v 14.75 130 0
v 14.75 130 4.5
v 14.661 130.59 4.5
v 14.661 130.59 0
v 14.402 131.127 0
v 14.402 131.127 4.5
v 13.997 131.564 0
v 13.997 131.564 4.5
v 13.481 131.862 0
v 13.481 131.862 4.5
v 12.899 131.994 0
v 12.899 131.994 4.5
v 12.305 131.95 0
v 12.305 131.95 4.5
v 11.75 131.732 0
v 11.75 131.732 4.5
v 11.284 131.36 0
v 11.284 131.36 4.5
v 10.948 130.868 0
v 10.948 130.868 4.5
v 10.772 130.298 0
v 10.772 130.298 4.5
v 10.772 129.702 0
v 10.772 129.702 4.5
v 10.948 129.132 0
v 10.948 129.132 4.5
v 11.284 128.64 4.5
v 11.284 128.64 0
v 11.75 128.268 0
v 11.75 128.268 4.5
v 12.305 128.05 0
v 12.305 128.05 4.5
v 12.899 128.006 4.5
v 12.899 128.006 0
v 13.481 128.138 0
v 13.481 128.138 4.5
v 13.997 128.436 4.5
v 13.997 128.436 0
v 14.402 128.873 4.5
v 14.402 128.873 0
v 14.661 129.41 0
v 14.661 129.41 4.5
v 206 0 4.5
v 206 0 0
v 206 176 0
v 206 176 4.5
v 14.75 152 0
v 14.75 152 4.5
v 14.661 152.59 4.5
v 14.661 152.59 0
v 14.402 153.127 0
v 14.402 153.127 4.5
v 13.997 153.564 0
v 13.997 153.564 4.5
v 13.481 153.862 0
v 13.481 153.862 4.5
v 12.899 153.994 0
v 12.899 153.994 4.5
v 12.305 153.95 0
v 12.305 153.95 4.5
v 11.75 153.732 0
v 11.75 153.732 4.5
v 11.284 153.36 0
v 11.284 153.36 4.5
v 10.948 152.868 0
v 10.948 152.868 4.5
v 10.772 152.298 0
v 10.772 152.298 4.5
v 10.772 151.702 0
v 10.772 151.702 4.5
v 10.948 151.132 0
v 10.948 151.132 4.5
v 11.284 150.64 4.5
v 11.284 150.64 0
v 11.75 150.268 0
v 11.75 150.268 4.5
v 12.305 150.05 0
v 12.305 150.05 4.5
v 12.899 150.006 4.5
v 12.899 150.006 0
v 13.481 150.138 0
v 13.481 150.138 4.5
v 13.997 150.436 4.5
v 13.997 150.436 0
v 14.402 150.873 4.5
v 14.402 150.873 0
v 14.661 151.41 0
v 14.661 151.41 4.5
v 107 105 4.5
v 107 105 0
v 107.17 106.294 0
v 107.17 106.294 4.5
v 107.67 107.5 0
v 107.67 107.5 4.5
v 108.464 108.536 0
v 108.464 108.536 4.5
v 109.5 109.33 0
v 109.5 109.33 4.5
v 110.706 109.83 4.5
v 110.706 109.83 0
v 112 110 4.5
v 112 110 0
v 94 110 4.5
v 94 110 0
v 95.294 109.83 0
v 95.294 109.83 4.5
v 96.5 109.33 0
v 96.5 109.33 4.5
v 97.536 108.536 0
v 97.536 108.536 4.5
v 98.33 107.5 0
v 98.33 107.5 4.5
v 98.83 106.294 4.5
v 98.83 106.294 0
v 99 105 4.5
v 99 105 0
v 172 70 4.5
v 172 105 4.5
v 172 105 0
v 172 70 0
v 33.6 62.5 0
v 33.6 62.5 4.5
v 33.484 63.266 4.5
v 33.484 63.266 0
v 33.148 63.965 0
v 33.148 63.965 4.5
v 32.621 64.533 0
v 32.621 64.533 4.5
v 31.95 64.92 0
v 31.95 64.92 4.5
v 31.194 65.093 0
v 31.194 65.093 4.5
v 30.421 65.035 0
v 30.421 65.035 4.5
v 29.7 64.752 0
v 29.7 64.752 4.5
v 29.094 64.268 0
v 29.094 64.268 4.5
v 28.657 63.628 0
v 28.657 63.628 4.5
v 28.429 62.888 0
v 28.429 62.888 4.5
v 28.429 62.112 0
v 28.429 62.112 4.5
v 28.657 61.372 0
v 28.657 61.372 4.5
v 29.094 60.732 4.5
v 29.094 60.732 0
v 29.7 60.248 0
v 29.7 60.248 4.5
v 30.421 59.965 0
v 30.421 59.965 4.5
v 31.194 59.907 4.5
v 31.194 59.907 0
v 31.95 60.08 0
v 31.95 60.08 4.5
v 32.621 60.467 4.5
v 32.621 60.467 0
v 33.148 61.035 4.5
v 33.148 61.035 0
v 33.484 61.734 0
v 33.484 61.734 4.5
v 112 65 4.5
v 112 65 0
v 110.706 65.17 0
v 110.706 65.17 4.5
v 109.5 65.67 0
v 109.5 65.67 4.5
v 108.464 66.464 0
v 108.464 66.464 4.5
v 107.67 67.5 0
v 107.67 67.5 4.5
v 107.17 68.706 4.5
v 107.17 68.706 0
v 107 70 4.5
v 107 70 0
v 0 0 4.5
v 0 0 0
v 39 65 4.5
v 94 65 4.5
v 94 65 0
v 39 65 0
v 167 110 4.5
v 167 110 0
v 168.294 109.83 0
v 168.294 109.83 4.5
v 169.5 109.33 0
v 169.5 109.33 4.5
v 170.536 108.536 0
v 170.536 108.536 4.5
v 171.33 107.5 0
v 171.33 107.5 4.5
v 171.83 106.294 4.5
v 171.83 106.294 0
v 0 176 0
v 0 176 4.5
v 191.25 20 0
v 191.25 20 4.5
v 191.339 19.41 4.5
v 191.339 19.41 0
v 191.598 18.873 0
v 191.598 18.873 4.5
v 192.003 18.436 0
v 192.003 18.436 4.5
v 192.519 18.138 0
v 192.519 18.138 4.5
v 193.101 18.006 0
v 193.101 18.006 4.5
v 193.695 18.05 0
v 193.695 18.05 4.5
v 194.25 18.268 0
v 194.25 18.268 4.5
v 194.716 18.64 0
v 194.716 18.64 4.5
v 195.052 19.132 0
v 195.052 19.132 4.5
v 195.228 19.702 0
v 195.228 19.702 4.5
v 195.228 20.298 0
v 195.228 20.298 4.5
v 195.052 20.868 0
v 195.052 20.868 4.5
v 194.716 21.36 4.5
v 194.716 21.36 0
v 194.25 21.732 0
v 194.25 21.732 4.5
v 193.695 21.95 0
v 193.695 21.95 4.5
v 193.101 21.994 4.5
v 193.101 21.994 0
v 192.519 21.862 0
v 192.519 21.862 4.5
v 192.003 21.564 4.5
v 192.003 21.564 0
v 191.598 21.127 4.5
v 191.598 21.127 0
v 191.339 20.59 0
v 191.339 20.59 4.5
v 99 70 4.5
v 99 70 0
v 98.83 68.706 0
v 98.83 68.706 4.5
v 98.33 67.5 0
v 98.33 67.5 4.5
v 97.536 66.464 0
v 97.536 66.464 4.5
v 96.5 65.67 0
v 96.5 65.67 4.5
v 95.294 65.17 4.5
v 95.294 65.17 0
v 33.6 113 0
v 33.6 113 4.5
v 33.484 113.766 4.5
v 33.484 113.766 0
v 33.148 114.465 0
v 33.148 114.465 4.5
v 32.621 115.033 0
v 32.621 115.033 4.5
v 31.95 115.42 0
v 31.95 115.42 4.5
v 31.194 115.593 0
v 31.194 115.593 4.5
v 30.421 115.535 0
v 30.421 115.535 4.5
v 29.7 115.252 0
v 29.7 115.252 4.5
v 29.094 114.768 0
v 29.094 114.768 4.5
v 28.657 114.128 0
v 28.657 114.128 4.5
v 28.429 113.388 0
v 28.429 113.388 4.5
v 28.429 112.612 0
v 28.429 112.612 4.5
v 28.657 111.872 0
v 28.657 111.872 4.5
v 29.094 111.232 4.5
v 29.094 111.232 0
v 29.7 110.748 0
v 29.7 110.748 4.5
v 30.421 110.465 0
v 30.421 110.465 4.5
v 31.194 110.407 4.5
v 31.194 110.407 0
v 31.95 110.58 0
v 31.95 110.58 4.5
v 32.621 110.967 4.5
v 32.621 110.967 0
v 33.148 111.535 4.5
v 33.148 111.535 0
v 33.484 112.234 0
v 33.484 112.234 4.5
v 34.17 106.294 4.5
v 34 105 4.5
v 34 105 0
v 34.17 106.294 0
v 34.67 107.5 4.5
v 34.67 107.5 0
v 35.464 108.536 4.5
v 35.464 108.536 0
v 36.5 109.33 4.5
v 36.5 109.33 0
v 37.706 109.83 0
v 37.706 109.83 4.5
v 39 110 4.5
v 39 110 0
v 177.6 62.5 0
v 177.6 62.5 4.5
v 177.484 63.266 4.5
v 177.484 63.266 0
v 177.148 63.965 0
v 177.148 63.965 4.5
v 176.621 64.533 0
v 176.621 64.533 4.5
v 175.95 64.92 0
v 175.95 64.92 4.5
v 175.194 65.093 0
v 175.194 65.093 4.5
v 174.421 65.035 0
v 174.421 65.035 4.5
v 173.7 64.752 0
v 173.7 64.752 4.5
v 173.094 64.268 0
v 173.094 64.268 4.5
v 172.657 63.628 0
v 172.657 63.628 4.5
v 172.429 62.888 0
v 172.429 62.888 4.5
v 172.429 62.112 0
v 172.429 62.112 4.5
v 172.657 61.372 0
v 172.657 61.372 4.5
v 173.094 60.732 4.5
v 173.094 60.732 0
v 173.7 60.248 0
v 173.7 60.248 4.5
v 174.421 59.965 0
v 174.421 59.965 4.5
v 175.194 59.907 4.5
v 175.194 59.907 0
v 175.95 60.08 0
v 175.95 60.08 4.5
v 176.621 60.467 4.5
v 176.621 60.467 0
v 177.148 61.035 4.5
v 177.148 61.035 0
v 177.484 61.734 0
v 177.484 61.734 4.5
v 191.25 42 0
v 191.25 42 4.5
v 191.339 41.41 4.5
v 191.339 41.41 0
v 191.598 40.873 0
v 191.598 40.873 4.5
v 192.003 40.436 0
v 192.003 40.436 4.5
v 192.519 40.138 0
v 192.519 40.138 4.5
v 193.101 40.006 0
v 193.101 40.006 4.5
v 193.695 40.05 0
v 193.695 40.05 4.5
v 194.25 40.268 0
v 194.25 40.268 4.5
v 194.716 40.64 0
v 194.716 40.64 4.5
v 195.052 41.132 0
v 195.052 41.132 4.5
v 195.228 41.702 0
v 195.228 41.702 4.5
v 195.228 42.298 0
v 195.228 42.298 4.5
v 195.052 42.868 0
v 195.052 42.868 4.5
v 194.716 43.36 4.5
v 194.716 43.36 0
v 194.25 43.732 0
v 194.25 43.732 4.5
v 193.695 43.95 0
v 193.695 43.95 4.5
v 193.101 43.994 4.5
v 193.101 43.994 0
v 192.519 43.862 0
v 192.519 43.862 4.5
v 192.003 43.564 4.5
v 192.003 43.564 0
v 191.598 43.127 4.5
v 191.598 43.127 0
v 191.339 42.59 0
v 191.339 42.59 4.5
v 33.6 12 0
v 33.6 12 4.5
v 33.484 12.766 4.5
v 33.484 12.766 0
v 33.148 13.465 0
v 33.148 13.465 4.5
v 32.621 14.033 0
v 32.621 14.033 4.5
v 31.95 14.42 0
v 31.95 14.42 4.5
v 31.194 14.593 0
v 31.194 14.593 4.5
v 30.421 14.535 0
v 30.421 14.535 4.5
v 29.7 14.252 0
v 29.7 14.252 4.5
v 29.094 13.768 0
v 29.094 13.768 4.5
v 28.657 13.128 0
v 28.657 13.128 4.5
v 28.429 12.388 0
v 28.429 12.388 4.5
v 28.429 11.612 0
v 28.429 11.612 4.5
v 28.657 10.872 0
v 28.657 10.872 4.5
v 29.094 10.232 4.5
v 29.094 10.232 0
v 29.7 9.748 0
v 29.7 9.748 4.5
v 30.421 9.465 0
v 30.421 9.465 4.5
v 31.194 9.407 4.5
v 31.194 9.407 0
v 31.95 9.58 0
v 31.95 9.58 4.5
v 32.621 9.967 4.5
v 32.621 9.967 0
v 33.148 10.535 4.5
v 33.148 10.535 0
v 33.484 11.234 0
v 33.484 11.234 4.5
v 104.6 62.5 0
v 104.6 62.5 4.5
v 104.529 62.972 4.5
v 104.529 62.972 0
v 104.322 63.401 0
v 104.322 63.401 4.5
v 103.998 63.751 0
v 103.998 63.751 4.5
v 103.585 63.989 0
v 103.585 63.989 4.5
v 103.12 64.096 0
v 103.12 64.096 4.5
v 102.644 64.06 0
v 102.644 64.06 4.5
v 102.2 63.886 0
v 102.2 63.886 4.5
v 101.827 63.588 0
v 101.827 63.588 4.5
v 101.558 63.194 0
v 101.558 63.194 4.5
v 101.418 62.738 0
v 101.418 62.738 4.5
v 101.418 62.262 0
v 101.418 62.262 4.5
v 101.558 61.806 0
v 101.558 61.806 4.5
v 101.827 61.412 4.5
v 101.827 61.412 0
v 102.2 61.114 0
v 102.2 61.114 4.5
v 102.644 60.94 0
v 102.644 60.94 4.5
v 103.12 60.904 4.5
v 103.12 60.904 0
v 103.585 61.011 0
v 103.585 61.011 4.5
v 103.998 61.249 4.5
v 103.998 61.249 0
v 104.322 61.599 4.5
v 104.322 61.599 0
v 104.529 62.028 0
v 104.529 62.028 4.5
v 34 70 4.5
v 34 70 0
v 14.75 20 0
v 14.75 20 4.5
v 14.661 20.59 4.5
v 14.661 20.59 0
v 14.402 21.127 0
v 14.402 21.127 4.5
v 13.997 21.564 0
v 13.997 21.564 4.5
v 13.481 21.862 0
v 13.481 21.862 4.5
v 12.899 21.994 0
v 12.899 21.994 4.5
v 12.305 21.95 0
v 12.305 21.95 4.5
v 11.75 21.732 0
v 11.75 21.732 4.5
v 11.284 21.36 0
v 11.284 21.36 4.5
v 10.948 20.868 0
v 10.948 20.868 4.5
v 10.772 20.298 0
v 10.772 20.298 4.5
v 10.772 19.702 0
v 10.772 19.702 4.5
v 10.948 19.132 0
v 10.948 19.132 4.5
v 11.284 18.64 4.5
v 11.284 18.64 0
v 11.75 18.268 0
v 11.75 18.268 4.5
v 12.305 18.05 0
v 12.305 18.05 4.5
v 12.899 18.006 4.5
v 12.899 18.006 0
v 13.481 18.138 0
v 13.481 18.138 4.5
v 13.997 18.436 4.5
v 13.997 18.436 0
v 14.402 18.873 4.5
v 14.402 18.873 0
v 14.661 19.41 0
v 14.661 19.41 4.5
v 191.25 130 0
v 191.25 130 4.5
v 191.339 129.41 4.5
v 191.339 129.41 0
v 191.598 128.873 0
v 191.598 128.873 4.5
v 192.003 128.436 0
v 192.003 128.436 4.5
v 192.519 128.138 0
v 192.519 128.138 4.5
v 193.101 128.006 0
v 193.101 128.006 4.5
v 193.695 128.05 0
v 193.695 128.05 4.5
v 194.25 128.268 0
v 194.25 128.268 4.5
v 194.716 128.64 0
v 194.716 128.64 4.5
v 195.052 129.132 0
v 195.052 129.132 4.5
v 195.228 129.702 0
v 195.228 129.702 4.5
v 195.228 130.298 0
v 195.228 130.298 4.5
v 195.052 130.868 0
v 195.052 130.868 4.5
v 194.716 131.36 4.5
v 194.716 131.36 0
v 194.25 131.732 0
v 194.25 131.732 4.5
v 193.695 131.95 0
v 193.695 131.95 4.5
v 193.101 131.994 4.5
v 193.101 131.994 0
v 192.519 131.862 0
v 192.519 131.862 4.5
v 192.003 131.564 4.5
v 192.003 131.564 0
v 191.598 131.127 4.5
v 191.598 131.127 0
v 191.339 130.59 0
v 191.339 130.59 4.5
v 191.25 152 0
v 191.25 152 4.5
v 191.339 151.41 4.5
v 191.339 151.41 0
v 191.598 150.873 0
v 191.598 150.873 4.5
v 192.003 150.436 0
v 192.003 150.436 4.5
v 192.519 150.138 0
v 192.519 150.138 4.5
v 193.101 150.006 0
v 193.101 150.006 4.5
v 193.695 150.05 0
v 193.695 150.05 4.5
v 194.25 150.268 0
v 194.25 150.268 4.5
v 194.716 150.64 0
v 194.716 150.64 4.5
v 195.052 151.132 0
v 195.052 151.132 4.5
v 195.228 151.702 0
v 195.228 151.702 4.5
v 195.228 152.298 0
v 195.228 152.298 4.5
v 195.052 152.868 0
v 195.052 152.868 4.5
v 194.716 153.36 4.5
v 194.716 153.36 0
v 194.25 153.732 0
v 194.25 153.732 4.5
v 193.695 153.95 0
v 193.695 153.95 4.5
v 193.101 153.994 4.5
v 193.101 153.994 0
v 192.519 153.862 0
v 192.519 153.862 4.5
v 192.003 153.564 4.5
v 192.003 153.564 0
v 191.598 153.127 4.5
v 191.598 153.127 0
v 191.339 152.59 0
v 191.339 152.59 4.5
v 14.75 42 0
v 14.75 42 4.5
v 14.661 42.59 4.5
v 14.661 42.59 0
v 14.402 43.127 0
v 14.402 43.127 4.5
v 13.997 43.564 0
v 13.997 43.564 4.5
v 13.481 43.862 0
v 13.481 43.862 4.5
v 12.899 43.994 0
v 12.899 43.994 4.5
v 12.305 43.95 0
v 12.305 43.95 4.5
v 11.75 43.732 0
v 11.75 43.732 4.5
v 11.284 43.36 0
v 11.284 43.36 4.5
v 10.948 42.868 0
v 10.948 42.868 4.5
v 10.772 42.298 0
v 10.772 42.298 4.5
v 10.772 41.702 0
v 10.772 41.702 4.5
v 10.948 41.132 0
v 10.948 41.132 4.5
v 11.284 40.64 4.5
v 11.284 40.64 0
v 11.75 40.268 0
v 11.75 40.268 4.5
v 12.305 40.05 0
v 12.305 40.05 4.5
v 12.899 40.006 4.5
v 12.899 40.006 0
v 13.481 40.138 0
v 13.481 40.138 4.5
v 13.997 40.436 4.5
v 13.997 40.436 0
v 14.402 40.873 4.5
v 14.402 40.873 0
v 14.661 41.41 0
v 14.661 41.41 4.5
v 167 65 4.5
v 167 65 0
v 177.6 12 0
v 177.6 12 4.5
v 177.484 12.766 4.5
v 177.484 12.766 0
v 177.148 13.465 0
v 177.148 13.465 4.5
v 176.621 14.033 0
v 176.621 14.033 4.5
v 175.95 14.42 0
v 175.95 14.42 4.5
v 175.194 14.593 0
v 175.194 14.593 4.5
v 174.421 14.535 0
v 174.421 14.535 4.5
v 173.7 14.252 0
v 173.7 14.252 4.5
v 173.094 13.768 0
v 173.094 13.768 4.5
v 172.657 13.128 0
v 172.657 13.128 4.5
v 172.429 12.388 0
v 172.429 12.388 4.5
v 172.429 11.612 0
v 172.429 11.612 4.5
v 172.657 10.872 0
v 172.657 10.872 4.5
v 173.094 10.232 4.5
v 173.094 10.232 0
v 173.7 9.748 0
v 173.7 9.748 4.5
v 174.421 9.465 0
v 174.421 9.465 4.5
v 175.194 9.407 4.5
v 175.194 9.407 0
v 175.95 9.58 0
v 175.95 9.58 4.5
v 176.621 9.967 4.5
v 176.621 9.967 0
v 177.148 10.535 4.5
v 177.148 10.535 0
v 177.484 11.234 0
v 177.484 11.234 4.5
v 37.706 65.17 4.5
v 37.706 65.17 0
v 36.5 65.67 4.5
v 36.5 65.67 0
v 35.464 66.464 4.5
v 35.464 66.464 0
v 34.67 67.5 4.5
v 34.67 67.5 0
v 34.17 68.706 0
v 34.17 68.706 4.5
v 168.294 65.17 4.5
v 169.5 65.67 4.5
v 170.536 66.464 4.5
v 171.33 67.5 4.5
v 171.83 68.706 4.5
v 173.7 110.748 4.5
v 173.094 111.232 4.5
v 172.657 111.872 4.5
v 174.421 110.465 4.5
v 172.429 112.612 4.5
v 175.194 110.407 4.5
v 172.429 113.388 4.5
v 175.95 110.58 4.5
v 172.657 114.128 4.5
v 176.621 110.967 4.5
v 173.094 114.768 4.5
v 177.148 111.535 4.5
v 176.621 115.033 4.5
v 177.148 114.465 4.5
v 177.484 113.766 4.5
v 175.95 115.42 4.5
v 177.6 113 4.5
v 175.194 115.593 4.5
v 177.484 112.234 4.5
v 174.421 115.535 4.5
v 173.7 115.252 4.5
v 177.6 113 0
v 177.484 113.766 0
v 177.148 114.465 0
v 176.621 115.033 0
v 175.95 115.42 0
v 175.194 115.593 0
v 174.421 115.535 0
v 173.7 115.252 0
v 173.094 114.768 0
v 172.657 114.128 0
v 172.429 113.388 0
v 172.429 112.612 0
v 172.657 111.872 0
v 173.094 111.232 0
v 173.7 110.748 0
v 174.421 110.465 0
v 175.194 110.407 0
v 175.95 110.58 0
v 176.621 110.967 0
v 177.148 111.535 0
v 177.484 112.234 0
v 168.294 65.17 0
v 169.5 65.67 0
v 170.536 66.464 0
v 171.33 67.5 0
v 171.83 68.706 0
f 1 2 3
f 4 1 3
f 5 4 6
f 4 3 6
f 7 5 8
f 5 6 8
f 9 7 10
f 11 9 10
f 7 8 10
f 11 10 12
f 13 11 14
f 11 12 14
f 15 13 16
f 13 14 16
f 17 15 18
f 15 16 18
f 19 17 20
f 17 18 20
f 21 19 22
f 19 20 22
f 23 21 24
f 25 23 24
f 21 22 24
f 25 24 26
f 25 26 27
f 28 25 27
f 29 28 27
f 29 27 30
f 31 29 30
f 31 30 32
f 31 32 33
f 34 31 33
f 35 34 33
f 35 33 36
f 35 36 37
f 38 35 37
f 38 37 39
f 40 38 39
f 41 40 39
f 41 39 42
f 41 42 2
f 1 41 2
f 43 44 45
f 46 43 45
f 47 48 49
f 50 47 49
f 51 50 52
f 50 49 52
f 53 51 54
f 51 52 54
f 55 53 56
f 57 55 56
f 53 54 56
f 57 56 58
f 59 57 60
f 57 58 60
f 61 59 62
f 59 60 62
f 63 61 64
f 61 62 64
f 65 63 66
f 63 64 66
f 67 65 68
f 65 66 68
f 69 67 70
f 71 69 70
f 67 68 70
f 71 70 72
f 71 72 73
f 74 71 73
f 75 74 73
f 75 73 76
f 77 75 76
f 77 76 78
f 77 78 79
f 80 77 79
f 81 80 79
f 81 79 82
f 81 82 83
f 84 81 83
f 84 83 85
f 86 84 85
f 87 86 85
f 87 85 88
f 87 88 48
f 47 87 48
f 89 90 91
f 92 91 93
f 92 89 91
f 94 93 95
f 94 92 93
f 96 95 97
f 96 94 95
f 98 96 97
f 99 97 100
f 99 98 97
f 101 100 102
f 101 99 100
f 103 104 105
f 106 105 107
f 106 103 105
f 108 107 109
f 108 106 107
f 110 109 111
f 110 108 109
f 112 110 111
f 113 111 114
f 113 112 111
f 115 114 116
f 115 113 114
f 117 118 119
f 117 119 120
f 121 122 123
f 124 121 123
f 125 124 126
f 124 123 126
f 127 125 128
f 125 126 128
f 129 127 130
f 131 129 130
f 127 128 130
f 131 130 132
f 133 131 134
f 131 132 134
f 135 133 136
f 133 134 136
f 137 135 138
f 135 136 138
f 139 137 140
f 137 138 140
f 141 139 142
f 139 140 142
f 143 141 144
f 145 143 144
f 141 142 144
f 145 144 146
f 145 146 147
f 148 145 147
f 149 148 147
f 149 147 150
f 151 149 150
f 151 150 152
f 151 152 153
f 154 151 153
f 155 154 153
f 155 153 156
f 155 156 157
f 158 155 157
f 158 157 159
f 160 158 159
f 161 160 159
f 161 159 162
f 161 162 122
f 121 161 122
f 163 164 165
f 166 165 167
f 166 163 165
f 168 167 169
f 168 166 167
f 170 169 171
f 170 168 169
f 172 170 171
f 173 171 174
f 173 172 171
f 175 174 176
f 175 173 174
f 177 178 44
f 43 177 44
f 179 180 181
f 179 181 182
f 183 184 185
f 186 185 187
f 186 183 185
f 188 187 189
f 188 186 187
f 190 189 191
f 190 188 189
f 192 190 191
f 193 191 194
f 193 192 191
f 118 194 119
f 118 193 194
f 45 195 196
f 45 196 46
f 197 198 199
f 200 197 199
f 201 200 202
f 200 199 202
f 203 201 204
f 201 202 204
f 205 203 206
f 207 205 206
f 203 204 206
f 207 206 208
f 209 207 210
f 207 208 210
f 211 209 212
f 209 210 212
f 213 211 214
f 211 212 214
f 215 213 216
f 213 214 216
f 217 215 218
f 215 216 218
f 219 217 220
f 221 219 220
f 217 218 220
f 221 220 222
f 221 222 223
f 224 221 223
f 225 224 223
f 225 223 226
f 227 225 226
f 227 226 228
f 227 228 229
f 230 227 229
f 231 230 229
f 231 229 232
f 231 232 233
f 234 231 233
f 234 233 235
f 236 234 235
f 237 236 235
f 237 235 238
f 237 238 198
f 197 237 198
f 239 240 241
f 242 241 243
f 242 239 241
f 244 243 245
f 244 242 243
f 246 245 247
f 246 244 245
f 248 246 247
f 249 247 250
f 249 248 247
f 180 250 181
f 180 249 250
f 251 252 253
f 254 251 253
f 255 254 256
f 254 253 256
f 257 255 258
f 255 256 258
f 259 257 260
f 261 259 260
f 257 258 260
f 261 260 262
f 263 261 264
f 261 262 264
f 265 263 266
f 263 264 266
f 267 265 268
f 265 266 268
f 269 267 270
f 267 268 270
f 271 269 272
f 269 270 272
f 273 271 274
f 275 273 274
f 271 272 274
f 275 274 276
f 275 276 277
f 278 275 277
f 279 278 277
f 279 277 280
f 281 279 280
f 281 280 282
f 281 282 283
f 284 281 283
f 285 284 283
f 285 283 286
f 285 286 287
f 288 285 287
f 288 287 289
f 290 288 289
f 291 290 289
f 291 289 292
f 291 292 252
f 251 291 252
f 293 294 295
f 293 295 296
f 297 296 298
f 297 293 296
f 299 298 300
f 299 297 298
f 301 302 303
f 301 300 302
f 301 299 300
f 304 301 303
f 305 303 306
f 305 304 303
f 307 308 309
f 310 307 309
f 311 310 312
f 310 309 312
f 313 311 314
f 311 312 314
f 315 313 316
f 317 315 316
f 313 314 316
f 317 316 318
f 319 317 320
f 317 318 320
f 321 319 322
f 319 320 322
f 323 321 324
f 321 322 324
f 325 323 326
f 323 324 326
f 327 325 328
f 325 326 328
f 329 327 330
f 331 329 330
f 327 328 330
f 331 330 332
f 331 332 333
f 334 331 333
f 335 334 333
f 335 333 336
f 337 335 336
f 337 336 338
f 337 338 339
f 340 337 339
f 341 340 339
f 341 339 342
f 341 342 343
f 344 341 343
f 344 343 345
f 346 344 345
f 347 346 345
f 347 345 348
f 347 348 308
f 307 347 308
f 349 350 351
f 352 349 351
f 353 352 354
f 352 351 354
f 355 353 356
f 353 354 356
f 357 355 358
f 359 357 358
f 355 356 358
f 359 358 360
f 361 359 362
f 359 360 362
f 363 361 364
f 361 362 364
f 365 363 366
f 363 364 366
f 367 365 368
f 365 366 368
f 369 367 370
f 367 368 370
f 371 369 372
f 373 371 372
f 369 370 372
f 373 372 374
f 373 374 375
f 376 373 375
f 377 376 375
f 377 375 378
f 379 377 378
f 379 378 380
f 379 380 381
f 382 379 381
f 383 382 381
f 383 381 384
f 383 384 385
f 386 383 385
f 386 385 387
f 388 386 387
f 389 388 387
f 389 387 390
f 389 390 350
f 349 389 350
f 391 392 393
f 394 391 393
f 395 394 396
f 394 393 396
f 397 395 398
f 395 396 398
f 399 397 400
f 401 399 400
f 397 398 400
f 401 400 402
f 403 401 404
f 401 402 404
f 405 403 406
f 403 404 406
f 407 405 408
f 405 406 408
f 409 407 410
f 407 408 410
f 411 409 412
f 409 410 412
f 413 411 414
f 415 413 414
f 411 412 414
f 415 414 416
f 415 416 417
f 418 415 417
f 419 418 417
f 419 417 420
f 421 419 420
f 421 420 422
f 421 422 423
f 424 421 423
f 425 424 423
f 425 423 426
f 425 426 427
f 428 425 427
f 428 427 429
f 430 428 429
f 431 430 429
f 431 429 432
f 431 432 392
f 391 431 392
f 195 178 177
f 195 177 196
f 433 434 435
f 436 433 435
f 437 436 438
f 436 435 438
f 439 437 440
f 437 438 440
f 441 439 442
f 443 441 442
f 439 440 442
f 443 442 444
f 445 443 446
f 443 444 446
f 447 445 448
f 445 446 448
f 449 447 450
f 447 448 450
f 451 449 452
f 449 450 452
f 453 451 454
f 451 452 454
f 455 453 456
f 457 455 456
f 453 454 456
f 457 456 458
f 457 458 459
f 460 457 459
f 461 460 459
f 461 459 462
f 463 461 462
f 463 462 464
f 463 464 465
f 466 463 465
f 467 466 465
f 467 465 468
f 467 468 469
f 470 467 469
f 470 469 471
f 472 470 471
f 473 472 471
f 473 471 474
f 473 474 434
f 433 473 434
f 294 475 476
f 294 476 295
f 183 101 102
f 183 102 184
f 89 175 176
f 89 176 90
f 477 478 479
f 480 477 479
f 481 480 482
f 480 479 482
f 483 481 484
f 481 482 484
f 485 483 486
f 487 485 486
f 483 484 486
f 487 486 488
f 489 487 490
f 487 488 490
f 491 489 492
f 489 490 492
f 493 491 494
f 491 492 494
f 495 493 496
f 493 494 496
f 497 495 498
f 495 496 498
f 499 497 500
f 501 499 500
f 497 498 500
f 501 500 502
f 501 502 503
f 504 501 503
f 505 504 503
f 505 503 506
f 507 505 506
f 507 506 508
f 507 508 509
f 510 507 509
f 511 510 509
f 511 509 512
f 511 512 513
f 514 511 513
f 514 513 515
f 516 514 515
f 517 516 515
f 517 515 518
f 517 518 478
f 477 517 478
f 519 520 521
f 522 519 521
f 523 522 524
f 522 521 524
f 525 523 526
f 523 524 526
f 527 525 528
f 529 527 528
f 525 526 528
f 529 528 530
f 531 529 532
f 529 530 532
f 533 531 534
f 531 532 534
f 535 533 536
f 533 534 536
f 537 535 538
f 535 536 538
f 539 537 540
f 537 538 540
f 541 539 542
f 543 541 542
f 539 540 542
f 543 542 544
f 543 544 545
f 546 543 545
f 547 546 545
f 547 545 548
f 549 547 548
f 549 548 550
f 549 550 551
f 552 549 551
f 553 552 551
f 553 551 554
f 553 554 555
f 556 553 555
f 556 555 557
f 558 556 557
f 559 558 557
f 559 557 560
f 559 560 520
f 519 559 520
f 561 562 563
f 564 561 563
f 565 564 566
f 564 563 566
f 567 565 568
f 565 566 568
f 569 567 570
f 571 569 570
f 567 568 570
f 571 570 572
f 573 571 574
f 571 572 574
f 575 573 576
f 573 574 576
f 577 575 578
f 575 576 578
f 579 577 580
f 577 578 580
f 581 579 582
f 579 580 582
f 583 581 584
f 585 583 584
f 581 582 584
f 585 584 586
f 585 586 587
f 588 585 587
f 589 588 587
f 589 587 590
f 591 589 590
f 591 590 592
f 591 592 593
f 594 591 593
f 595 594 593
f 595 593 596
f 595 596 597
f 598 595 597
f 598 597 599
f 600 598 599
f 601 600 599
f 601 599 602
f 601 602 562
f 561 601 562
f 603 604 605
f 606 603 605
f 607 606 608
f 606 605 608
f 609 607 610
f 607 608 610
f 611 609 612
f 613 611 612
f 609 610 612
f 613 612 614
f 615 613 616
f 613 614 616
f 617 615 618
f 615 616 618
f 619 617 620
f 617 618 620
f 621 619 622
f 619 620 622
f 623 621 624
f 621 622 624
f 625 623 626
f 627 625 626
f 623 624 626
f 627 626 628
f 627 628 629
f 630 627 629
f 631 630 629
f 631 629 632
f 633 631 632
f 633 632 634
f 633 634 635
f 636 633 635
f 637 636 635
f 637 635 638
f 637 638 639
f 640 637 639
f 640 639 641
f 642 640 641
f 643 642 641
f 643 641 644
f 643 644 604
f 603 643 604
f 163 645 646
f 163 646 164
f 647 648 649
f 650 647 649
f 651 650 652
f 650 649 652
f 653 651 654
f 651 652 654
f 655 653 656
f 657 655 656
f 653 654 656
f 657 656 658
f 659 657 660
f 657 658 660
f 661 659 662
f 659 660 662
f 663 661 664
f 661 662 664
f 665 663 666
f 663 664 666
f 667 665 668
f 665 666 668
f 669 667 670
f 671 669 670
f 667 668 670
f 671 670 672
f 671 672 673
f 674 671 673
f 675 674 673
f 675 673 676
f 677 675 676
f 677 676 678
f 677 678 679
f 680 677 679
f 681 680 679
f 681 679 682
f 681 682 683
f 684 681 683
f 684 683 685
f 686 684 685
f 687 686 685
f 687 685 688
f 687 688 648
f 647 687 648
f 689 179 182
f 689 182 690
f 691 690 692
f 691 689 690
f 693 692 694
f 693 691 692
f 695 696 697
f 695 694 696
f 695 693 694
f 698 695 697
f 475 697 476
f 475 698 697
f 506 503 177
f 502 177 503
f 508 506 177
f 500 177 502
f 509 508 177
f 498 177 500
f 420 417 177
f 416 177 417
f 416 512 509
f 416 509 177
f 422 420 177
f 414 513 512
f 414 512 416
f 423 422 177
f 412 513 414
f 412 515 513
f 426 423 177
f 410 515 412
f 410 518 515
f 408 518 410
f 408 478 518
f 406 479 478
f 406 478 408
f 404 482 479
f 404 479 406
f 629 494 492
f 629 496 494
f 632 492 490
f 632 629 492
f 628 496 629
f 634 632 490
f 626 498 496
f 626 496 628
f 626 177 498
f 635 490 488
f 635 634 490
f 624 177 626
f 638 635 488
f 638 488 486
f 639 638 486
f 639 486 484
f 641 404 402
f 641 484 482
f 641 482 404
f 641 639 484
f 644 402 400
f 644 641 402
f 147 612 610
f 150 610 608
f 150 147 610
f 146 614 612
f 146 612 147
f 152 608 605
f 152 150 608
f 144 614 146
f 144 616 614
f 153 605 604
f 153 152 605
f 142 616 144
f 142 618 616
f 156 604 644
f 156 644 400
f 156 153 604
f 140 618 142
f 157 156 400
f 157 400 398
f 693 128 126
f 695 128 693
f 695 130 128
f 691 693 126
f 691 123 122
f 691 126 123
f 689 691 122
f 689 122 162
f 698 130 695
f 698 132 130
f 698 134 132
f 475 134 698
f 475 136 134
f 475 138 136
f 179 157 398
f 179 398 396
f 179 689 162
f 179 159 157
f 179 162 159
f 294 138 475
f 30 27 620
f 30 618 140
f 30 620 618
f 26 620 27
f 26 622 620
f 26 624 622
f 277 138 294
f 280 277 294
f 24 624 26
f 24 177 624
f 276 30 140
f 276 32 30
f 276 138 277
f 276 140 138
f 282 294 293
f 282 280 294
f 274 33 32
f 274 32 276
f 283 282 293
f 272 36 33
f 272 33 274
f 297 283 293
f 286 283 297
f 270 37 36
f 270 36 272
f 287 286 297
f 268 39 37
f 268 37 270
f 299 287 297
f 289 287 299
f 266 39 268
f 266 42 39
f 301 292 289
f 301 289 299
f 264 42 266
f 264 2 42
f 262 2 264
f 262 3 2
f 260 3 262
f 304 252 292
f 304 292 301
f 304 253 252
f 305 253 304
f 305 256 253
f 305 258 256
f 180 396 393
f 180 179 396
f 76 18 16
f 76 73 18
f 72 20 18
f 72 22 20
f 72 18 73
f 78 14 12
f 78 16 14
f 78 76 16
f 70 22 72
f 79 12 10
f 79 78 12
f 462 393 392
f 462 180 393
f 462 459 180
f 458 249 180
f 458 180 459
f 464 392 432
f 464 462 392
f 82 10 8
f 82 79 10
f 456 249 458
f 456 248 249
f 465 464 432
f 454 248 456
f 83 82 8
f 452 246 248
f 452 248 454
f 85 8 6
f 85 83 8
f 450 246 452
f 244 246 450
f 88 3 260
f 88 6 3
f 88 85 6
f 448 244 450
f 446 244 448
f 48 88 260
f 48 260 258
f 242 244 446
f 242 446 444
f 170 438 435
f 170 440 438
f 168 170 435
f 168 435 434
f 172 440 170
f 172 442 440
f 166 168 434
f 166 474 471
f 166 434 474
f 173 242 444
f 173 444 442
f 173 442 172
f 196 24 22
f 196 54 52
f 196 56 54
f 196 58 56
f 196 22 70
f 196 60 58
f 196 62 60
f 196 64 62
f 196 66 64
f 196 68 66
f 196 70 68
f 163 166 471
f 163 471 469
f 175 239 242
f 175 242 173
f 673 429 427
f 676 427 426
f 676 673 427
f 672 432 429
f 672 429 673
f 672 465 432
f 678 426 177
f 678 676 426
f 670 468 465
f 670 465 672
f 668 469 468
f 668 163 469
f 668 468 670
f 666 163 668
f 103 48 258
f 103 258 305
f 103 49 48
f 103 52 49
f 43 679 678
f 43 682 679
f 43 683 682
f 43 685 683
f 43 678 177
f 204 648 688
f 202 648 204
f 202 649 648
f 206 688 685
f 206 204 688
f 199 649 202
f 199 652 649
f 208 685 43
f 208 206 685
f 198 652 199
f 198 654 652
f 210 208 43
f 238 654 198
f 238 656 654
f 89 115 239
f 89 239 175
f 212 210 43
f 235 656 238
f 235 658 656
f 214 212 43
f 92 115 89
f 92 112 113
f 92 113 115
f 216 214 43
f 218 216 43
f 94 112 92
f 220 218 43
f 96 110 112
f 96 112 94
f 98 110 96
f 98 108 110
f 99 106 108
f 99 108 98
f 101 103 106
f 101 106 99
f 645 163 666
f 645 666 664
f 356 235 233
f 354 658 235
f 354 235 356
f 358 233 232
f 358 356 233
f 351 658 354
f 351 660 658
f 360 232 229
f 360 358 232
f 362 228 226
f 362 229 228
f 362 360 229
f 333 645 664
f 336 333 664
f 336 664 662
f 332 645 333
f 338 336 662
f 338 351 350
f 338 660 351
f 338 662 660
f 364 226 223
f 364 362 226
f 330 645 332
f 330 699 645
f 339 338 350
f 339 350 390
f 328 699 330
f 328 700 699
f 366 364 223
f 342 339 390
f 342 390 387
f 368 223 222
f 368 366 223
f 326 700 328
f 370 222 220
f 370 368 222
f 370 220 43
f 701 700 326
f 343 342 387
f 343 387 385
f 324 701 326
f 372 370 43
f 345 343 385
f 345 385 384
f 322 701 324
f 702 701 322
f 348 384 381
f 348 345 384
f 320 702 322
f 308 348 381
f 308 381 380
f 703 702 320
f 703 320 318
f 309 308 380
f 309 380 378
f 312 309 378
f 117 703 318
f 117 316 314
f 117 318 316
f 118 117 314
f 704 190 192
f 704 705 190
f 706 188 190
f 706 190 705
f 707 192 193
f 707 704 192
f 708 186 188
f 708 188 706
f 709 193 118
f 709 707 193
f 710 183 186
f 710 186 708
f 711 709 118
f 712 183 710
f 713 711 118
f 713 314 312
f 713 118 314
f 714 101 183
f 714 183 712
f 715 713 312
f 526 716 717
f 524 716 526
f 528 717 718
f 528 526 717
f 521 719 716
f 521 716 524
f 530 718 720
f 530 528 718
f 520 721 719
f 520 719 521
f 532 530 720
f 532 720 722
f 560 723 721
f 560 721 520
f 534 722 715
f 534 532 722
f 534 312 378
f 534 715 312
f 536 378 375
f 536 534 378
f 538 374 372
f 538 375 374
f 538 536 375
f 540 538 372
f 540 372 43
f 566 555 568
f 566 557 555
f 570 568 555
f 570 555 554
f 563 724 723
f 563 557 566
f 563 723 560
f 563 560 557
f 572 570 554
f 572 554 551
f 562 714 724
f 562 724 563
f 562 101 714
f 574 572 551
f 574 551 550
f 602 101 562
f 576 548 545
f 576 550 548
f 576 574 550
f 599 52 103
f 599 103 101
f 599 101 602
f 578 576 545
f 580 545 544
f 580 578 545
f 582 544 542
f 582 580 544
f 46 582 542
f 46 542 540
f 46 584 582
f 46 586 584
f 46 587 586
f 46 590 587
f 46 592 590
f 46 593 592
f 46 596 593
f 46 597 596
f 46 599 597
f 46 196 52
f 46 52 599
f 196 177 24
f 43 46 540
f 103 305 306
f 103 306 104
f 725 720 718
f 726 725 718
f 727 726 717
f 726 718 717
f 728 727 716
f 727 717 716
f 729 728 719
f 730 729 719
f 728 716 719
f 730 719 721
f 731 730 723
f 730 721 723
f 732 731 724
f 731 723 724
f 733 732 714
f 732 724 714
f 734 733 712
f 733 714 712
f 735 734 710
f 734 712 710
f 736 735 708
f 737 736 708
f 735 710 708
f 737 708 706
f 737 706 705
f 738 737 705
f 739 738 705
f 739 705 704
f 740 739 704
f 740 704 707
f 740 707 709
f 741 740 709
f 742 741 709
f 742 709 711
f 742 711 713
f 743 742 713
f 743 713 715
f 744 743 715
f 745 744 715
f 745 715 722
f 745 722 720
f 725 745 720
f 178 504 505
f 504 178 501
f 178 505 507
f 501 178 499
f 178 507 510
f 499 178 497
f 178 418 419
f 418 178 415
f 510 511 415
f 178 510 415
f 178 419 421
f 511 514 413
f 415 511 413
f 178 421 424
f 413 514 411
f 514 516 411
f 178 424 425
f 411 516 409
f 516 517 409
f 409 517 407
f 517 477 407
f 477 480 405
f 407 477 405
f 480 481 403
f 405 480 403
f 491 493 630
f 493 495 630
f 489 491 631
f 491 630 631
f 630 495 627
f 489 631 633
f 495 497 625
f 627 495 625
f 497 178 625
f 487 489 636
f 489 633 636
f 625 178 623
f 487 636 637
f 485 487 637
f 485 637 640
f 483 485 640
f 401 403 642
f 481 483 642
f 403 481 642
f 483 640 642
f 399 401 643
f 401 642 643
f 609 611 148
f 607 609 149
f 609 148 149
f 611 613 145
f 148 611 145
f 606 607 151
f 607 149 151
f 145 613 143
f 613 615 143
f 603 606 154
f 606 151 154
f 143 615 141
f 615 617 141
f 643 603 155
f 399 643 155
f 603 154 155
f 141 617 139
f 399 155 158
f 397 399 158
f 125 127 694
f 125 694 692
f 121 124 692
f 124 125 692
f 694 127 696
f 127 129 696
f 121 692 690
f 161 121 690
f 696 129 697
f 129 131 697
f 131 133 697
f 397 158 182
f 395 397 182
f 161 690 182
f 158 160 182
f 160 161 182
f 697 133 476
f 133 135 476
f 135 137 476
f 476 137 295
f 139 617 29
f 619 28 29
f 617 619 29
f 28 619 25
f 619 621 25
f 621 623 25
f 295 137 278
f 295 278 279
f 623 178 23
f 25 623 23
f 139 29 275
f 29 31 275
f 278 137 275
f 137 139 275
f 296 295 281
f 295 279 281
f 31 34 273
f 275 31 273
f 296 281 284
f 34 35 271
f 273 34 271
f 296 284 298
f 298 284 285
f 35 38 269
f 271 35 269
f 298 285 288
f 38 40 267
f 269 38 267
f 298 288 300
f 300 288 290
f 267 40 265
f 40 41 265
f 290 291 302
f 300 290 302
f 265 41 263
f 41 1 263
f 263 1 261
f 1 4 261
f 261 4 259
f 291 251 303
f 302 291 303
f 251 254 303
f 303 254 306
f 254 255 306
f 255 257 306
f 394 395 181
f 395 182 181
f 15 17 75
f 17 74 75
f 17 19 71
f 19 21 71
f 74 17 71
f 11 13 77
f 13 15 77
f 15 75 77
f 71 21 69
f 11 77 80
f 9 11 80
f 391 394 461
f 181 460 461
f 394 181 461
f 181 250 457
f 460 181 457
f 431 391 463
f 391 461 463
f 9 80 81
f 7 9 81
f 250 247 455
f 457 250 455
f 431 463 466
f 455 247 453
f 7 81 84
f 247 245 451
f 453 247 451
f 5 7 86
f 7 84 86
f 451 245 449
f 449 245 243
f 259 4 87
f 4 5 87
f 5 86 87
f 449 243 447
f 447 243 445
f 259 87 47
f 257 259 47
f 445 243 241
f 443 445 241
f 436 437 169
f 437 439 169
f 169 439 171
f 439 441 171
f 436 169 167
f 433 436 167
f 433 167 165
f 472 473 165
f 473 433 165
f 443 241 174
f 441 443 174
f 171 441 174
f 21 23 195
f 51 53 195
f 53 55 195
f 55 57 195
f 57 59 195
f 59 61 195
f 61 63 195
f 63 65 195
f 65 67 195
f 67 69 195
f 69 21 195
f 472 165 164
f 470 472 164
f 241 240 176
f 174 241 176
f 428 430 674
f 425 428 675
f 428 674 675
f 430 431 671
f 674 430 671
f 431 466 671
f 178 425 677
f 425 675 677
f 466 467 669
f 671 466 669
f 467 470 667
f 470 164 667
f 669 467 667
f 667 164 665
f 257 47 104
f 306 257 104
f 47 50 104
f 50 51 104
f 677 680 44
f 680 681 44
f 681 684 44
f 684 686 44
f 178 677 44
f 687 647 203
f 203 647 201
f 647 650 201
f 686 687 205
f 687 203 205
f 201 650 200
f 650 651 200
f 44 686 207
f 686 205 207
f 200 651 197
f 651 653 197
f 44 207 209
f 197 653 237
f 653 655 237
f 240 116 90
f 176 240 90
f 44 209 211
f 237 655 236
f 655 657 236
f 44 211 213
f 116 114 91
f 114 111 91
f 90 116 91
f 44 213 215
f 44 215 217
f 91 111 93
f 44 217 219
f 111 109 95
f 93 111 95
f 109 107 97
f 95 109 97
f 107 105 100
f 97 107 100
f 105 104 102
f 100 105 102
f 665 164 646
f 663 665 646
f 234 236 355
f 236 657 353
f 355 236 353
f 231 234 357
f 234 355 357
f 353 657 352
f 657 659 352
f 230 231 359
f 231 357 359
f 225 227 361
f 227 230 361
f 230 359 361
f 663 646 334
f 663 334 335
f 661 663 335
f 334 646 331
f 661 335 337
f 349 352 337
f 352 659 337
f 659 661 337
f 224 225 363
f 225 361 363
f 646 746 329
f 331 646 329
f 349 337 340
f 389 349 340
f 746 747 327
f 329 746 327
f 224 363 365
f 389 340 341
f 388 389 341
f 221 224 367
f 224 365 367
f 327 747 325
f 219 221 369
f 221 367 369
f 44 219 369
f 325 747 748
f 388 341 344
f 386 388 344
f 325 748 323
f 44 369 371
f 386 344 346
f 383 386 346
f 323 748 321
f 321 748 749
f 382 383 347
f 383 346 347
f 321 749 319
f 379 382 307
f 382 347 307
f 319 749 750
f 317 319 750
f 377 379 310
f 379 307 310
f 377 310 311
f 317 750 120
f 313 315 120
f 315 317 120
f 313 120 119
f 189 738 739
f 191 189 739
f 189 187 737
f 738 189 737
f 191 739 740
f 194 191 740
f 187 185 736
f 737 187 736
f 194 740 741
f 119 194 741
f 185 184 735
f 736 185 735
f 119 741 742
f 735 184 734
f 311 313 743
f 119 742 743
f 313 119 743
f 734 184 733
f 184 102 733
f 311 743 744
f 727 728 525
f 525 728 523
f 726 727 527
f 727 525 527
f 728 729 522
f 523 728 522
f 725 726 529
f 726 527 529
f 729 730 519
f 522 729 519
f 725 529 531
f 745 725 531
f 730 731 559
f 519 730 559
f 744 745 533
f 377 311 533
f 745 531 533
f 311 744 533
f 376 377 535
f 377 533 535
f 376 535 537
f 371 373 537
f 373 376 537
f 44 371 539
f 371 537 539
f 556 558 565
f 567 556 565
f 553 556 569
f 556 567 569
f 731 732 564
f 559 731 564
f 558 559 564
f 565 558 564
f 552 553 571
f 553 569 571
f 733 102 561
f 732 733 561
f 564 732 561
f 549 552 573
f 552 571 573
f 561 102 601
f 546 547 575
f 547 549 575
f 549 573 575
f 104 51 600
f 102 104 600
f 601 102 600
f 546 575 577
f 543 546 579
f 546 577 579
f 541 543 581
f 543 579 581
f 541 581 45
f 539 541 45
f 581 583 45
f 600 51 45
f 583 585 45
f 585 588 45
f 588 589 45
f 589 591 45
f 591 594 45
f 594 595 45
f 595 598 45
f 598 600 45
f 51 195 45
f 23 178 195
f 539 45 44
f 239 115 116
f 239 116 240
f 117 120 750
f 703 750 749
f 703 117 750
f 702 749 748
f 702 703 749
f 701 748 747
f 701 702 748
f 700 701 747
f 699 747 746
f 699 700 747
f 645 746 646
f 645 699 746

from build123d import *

# Parameters (mm, degrees)
SKETCH_1_W          = 206
SKETCH_1_H          = 176
EXTRUDE_1_DEPTH     = 4.5
CUT_EXTRUDE_1_REACH = 272.984
SKETCH_2_R          = 2
CUT_EXTRUDE_2_REACH = 272.984
SKETCH_3_R          = 2.6
SKETCH_3_R_2        = 1.6


with BuildPart() as part:
    # 草图1 → 凸台-拉伸1 (new body)
    with BuildSketch(Plane.XY):
        with Locations((103, 88)):
            Rectangle(SKETCH_1_W, SKETCH_1_H)
    extrude(amount=EXTRUDE_1_DEPTH)

    # 草图2 → 切除-拉伸1 (cut, up to next)
    with BuildSketch(Plane.XY.offset(4.5), mode=Mode.PRIVATE) as cut_extrude_1_sk1:
        with Locations((12.75, 152)):
            Circle(SKETCH_2_R)
    cut_extrude_1_tool1 = extrude(cut_extrude_1_sk1.sketch, amount=-CUT_EXTRUDE_1_REACH, mode=Mode.PRIVATE) & part.part
    # 草图2 → 切除-拉伸1 (cut, up to next)
    with BuildSketch(Plane.XY.offset(4.5), mode=Mode.PRIVATE) as cut_extrude_1_sk2:
        with Locations((12.75, 130)):
            Circle(SKETCH_2_R)
    cut_extrude_1_tool2 = extrude(cut_extrude_1_sk2.sketch, amount=-CUT_EXTRUDE_1_REACH, mode=Mode.PRIVATE) & part.part
    # 草图2 → 切除-拉伸1 (cut, up to next)
    with BuildSketch(Plane.XY.offset(4.5), mode=Mode.PRIVATE) as cut_extrude_1_sk3:
        with Locations((12.75, 42)):
            Circle(SKETCH_2_R)
    cut_extrude_1_tool3 = extrude(cut_extrude_1_sk3.sketch, amount=-CUT_EXTRUDE_1_REACH, mode=Mode.PRIVATE) & part.part
    # 草图2 → 切除-拉伸1 (cut, up to next)
    with BuildSketch(Plane.XY.offset(4.5), mode=Mode.PRIVATE) as cut_extrude_1_sk4:
        with Locations((12.75, 20)):
            Circle(SKETCH_2_R)
    cut_extrude_1_tool4 = extrude(cut_extrude_1_sk4.sketch, amount=-CUT_EXTRUDE_1_REACH, mode=Mode.PRIVATE) & part.part
    # 草图2 → 切除-拉伸1 (cut, up to next)
    with BuildSketch(Plane.XY.offset(4.5), mode=Mode.PRIVATE) as cut_extrude_1_sk5:
        with Locations(Location((193.25, 20, 0), (0, 0, 180))):
            Circle(SKETCH_2_R)
    cut_extrude_1_tool5 = extrude(cut_extrude_1_sk5.sketch, amount=-CUT_EXTRUDE_1_REACH, mode=Mode.PRIVATE) & part.part
    # 草图2 → 切除-拉伸1 (cut, up to next)
    with BuildSketch(Plane.XY.offset(4.5), mode=Mode.PRIVATE) as cut_extrude_1_sk6:
        with Locations(Location((193.25, 42, 0), (0, 0, 180))):
            Circle(SKETCH_2_R)
    cut_extrude_1_tool6 = extrude(cut_extrude_1_sk6.sketch, amount=-CUT_EXTRUDE_1_REACH, mode=Mode.PRIVATE) & part.part
    # 草图2 → 切除-拉伸1 (cut, up to next)
    with BuildSketch(Plane.XY.offset(4.5), mode=Mode.PRIVATE) as cut_extrude_1_sk7:
        with Locations(Location((193.25, 130, 0), (0, 0, 180))):
            Circle(SKETCH_2_R)
    cut_extrude_1_tool7 = extrude(cut_extrude_1_sk7.sketch, amount=-CUT_EXTRUDE_1_REACH, mode=Mode.PRIVATE) & part.part
    # 草图2 → 切除-拉伸1 (cut, up to next)
    with BuildSketch(Plane.XY.offset(4.5), mode=Mode.PRIVATE) as cut_extrude_1_sk8:
        with Locations(Location((193.25, 152, 0), (0, 0, 180))):
            Circle(SKETCH_2_R)
    cut_extrude_1_tool8 = extrude(cut_extrude_1_sk8.sketch, amount=-CUT_EXTRUDE_1_REACH, mode=Mode.PRIVATE) & part.part
    add(cut_extrude_1_tool1.solids().sort_by_distance((12.75, 152, 4.5))[0], mode=Mode.SUBTRACT)
    add(cut_extrude_1_tool2.solids().sort_by_distance((12.75, 130, 4.5))[0], mode=Mode.SUBTRACT)
    add(cut_extrude_1_tool3.solids().sort_by_distance((12.75, 42, 4.5))[0], mode=Mode.SUBTRACT)
    add(cut_extrude_1_tool4.solids().sort_by_distance((12.75, 20, 4.5))[0], mode=Mode.SUBTRACT)
    add(cut_extrude_1_tool5.solids().sort_by_distance((193.25, 20, 4.5))[0], mode=Mode.SUBTRACT)
    add(cut_extrude_1_tool6.solids().sort_by_distance((193.25, 42, 4.5))[0], mode=Mode.SUBTRACT)
    add(cut_extrude_1_tool7.solids().sort_by_distance((193.25, 130, 4.5))[0], mode=Mode.SUBTRACT)
    add(cut_extrude_1_tool8.solids().sort_by_distance((193.25, 152, 4.5))[0], mode=Mode.SUBTRACT)

    # 草图3 → 切除-拉伸2 (cut, up to next)
    with BuildSketch(Plane.XY.offset(4.5), mode=Mode.PRIVATE) as cut_extrude_2_sk1:
        with Locations((31, 113)):
            Circle(SKETCH_3_R)
    cut_extrude_2_tool1 = extrude(cut_extrude_2_sk1.sketch, amount=-CUT_EXTRUDE_2_REACH, mode=Mode.PRIVATE) & part.part
    # 草图3 → 切除-拉伸2 (cut, up to next)
    with BuildSketch(Plane.XY.offset(4.5), mode=Mode.PRIVATE) as cut_extrude_2_sk2:
        with Locations((31, 62.5)):
            Circle(SKETCH_3_R)
    cut_extrude_2_tool2 = extrude(cut_extrude_2_sk2.sketch, amount=-CUT_EXTRUDE_2_REACH, mode=Mode.PRIVATE) & part.part
    # 草图3 → 切除-拉伸2 (cut, up to next)
    with BuildSketch(Plane.XY.offset(4.5), mode=Mode.PRIVATE) as cut_extrude_2_sk3:
        with Locations((31, 12)):
            Circle(SKETCH_3_R)
    cut_extrude_2_tool3 = extrude(cut_extrude_2_sk3.sketch, amount=-CUT_EXTRUDE_2_REACH, mode=Mode.PRIVATE) & part.part
    # 草图3 → 切除-拉伸2 (cut, up to next)
    with BuildSketch(Plane.XY.offset(4.5), mode=Mode.PRIVATE) as cut_extrude_2_sk4:
        with Locations((175, 12)):
            Circle(SKETCH_3_R)
    cut_extrude_2_tool4 = extrude(cut_extrude_2_sk4.sketch, amount=-CUT_EXTRUDE_2_REACH, mode=Mode.PRIVATE) & part.part
    # 草图3 → 切除-拉伸2 (cut, up to next)
    with BuildSketch(Plane.XY.offset(4.5), mode=Mode.PRIVATE) as cut_extrude_2_sk5:
        with Locations((175, 62.5)):
            Circle(SKETCH_3_R)
    cut_extrude_2_tool5 = extrude(cut_extrude_2_sk5.sketch, amount=-CUT_EXTRUDE_2_REACH, mode=Mode.PRIVATE) & part.part
    # 草图3 → 切除-拉伸2 (cut, up to next)
    with BuildSketch(Plane.XY.offset(4.5), mode=Mode.PRIVATE) as cut_extrude_2_sk6:
        with Locations((175, 113)):
            Circle(SKETCH_3_R)
    cut_extrude_2_tool6 = extrude(cut_extrude_2_sk6.sketch, amount=-CUT_EXTRUDE_2_REACH, mode=Mode.PRIVATE) & part.part
    # 草图3 → 切除-拉伸2 (cut, up to next)
    with BuildSketch(Plane.XY.offset(4.5), mode=Mode.PRIVATE) as cut_extrude_2_sk7:
        with Locations((103, 62.5)):
            Circle(SKETCH_3_R_2)
    cut_extrude_2_tool7 = extrude(cut_extrude_2_sk7.sketch, amount=-CUT_EXTRUDE_2_REACH, mode=Mode.PRIVATE) & part.part
    # 草图3 → 切除-拉伸2 (cut, up to next)
    with BuildSketch(Plane.XY.offset(4.5), mode=Mode.PRIVATE) as cut_extrude_2_sk8:
        with BuildLine():
            Line((167, 65), (112, 65))
            ThreePointArc((112, 65), (108.464466094, 66.464466094), (107, 70))
            Line((107, 70), (107, 105))
            ThreePointArc((107, 105), (108.464466094, 108.535533906), (112, 110))
            Line((112, 110), (167, 110))
            ThreePointArc((167, 110), (170.535533906, 108.535533906), (172, 105))
            Line((172, 105), (172, 70))
            ThreePointArc((172, 70), (170.535533906, 66.464466094), (167, 65))
        make_face()
    cut_extrude_2_tool8 = extrude(cut_extrude_2_sk8.sketch, amount=-CUT_EXTRUDE_2_REACH, mode=Mode.PRIVATE) & part.part
    # 草图3 → 切除-拉伸2 (cut, up to next)
    with BuildSketch(Plane.XY.offset(4.5), mode=Mode.PRIVATE) as cut_extrude_2_sk9:
        with BuildLine():
            Line((39, 110), (94, 110))
            ThreePointArc((94, 110), (97.535533906, 108.535533906), (99, 105))
            Line((99, 105), (99, 70))
            ThreePointArc((99, 70), (97.535533906, 66.464466094), (94, 65))
            Line((94, 65), (39, 65))
            ThreePointArc((39, 65), (35.464466094, 66.464466094), (34, 70))
            Line((34, 70), (34, 105))
            ThreePointArc((34, 105), (35.464466094, 108.535533906), (39, 110))
        make_face()
    cut_extrude_2_tool9 = extrude(cut_extrude_2_sk9.sketch, amount=-CUT_EXTRUDE_2_REACH, mode=Mode.PRIVATE) & part.part
    add(cut_extrude_2_tool1.solids().sort_by_distance((31, 113, 4.5))[0], mode=Mode.SUBTRACT)
    add(cut_extrude_2_tool2.solids().sort_by_distance((31, 62.5, 4.5))[0], mode=Mode.SUBTRACT)
    add(cut_extrude_2_tool3.solids().sort_by_distance((31, 12, 4.5))[0], mode=Mode.SUBTRACT)
    add(cut_extrude_2_tool4.solids().sort_by_distance((175, 12, 4.5))[0], mode=Mode.SUBTRACT)
    add(cut_extrude_2_tool5.solids().sort_by_distance((175, 62.5, 4.5))[0], mode=Mode.SUBTRACT)
    add(cut_extrude_2_tool6.solids().sort_by_distance((175, 113, 4.5))[0], mode=Mode.SUBTRACT)
    add(cut_extrude_2_tool7.solids().sort_by_distance((103, 62.5, 4.5))[0], mode=Mode.SUBTRACT)
    add(cut_extrude_2_tool8.solids().sort_by_distance((139.5, 87.5, 4.5))[0], mode=Mode.SUBTRACT)
    add(cut_extrude_2_tool9.solids().sort_by_distance((66.5, 87.5, 4.5))[0], mode=Mode.SUBTRACT)


solid = part.part
